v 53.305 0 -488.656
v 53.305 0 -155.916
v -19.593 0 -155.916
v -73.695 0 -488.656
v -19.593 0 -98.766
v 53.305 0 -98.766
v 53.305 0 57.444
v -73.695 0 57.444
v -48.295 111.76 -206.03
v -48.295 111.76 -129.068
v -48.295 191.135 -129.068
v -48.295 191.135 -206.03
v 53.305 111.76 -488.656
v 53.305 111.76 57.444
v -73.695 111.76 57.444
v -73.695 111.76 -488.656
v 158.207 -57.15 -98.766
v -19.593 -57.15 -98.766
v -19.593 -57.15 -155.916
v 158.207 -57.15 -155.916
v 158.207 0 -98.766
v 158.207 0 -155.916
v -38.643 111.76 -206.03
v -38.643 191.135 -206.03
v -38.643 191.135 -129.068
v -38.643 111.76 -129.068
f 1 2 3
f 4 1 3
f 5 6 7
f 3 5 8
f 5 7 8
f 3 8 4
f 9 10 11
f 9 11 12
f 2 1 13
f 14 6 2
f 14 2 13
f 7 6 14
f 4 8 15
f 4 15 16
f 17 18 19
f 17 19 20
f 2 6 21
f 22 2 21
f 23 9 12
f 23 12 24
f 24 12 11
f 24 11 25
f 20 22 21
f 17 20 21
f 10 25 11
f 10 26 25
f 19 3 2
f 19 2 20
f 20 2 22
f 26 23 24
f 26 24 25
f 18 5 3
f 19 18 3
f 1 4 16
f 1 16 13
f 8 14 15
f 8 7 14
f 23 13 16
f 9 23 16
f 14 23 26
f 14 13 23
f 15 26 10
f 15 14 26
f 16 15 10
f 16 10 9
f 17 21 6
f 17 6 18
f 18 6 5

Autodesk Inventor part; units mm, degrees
ref_plane "YZ Plane" through (0, 0, 0) normal (1, 0, 0) x (0, 1, 0)
ref_plane "XZ Plane" through (0, 0, 0) normal (0, 1, 0) x (-1, 0, 0)
ref_plane "XY Plane" through (0, 0, 0) normal (0, 0, 1) x (1, 0, 0)
sketch "Sketch1" plane through (0, 0, 0) normal (0, 1, 0) x (-1, 0, 0)
  line L0 (-53.3048, 57.4444) -> (73.6952, 57.4444)
  line L1 (73.6952, 57.4444) -> (73.6952, -488.6556)
  line L2 (73.6952, -488.6556) -> (-53.3048, -488.6556)
  line L3 (-53.3048, -488.6556) -> (-53.3048, 57.4444)
  point P0 (0, 0)
  dimension "d0" = 127
  dimension "d1" = 546.1
extrude "Extrusion1" add sketch "Sketch1" along normal blind 111.76
sketch "Sketch2" plane through (0, 111.76, 0) normal (0, 1, 0) x (1, 0, 0)
  line L0 (-38.6432, 129.0678) -> (-48.2952, 129.0678)
  line L1 (-48.2952, 129.0678) -> (-48.2952, 206.0298)
  line L2 (-48.2952, 206.0298) -> (-38.6432, 206.0298)
  line L3 (-38.6432, 206.0298) -> (-38.6432, 129.0678)
  line L4 (53.3048, -57.4444) -> (53.3048, 488.6556) projected
  line L5 (-73.6952, 488.6556) -> (-73.6952, -57.4444) projected
  line L6 (-73.6952, -57.4444) -> (53.3048, -57.4444) projected
  point P0 (0, 0)
  dimension "d4" = 9.652
  dimension "d5" = 76.962
  dimension "d8" = 25.4
  dimension "d9" = 186.5122
extrude "Extrusion2" add sketch "Sketch2" along normal blind 79.375
sketch "Sketch3" plane through (-38.6432, 111.76, -129.0678) normal (1, 0, 0) x (0, 0, -1)
  line L0 (16.1079, 65.0185) -> (71.5479, 65.0185) construction
  line L1 (71.5479, 65.0185) -> (71.5479, 29.0665) construction
  line L2 (71.5479, 29.0665) -> (16.1079, 29.0665) construction
  line L3 (16.1079, 29.0665) -> (16.1079, 65.0185) construction
  point P0 (-129.0678, -111.76)
sketch "Sketch4" plane through (0, 0, 0) normal (0, -1, 0) x (1, 0, 0)
  line L0 (-19.5932, -155.9156) -> (158.2068, -155.9156)
  line L1 (158.2068, -155.9156) -> (158.2068, -98.7656)
  line L2 (158.2068, -98.7656) -> (-19.5932, -98.7656)
  line L3 (-19.5932, -98.7656) -> (-19.5932, -155.9156)
  line L4 (-73.6952, -488.6556) -> (53.3048, -488.6556) projected
  line L5 (-73.6952, 57.4444) -> (-73.6952, -488.6556) projected
  point P0 (0, 0)
  dimension "d13" = 332.74
  dimension "d14" = 57.15
  dimension "d15" = 54.102
  dimension "d16" = 177.8
extrude "Extrusion3" add sketch "Sketch4" along normal blind 57.15
sketch "Sketch5" plane through (158.2068, 0, -155.9156) normal (0, 0, -1) x (-1, 0, 0)
  line L0 (25.6026, -7.1293) -> (89.7659, -7.1293) construction
  line L1 (89.7659, -7.1293) -> (89.7659, -41.3497) construction
  line L2 (89.7659, -41.3497) -> (25.6026, -41.3497) construction
  line L3 (25.6026, -41.3497) -> (25.6026, -7.1293) construction
  point P0 (158.2068, 0)
properties part number "CLB_056_4StagePlaceholder"
